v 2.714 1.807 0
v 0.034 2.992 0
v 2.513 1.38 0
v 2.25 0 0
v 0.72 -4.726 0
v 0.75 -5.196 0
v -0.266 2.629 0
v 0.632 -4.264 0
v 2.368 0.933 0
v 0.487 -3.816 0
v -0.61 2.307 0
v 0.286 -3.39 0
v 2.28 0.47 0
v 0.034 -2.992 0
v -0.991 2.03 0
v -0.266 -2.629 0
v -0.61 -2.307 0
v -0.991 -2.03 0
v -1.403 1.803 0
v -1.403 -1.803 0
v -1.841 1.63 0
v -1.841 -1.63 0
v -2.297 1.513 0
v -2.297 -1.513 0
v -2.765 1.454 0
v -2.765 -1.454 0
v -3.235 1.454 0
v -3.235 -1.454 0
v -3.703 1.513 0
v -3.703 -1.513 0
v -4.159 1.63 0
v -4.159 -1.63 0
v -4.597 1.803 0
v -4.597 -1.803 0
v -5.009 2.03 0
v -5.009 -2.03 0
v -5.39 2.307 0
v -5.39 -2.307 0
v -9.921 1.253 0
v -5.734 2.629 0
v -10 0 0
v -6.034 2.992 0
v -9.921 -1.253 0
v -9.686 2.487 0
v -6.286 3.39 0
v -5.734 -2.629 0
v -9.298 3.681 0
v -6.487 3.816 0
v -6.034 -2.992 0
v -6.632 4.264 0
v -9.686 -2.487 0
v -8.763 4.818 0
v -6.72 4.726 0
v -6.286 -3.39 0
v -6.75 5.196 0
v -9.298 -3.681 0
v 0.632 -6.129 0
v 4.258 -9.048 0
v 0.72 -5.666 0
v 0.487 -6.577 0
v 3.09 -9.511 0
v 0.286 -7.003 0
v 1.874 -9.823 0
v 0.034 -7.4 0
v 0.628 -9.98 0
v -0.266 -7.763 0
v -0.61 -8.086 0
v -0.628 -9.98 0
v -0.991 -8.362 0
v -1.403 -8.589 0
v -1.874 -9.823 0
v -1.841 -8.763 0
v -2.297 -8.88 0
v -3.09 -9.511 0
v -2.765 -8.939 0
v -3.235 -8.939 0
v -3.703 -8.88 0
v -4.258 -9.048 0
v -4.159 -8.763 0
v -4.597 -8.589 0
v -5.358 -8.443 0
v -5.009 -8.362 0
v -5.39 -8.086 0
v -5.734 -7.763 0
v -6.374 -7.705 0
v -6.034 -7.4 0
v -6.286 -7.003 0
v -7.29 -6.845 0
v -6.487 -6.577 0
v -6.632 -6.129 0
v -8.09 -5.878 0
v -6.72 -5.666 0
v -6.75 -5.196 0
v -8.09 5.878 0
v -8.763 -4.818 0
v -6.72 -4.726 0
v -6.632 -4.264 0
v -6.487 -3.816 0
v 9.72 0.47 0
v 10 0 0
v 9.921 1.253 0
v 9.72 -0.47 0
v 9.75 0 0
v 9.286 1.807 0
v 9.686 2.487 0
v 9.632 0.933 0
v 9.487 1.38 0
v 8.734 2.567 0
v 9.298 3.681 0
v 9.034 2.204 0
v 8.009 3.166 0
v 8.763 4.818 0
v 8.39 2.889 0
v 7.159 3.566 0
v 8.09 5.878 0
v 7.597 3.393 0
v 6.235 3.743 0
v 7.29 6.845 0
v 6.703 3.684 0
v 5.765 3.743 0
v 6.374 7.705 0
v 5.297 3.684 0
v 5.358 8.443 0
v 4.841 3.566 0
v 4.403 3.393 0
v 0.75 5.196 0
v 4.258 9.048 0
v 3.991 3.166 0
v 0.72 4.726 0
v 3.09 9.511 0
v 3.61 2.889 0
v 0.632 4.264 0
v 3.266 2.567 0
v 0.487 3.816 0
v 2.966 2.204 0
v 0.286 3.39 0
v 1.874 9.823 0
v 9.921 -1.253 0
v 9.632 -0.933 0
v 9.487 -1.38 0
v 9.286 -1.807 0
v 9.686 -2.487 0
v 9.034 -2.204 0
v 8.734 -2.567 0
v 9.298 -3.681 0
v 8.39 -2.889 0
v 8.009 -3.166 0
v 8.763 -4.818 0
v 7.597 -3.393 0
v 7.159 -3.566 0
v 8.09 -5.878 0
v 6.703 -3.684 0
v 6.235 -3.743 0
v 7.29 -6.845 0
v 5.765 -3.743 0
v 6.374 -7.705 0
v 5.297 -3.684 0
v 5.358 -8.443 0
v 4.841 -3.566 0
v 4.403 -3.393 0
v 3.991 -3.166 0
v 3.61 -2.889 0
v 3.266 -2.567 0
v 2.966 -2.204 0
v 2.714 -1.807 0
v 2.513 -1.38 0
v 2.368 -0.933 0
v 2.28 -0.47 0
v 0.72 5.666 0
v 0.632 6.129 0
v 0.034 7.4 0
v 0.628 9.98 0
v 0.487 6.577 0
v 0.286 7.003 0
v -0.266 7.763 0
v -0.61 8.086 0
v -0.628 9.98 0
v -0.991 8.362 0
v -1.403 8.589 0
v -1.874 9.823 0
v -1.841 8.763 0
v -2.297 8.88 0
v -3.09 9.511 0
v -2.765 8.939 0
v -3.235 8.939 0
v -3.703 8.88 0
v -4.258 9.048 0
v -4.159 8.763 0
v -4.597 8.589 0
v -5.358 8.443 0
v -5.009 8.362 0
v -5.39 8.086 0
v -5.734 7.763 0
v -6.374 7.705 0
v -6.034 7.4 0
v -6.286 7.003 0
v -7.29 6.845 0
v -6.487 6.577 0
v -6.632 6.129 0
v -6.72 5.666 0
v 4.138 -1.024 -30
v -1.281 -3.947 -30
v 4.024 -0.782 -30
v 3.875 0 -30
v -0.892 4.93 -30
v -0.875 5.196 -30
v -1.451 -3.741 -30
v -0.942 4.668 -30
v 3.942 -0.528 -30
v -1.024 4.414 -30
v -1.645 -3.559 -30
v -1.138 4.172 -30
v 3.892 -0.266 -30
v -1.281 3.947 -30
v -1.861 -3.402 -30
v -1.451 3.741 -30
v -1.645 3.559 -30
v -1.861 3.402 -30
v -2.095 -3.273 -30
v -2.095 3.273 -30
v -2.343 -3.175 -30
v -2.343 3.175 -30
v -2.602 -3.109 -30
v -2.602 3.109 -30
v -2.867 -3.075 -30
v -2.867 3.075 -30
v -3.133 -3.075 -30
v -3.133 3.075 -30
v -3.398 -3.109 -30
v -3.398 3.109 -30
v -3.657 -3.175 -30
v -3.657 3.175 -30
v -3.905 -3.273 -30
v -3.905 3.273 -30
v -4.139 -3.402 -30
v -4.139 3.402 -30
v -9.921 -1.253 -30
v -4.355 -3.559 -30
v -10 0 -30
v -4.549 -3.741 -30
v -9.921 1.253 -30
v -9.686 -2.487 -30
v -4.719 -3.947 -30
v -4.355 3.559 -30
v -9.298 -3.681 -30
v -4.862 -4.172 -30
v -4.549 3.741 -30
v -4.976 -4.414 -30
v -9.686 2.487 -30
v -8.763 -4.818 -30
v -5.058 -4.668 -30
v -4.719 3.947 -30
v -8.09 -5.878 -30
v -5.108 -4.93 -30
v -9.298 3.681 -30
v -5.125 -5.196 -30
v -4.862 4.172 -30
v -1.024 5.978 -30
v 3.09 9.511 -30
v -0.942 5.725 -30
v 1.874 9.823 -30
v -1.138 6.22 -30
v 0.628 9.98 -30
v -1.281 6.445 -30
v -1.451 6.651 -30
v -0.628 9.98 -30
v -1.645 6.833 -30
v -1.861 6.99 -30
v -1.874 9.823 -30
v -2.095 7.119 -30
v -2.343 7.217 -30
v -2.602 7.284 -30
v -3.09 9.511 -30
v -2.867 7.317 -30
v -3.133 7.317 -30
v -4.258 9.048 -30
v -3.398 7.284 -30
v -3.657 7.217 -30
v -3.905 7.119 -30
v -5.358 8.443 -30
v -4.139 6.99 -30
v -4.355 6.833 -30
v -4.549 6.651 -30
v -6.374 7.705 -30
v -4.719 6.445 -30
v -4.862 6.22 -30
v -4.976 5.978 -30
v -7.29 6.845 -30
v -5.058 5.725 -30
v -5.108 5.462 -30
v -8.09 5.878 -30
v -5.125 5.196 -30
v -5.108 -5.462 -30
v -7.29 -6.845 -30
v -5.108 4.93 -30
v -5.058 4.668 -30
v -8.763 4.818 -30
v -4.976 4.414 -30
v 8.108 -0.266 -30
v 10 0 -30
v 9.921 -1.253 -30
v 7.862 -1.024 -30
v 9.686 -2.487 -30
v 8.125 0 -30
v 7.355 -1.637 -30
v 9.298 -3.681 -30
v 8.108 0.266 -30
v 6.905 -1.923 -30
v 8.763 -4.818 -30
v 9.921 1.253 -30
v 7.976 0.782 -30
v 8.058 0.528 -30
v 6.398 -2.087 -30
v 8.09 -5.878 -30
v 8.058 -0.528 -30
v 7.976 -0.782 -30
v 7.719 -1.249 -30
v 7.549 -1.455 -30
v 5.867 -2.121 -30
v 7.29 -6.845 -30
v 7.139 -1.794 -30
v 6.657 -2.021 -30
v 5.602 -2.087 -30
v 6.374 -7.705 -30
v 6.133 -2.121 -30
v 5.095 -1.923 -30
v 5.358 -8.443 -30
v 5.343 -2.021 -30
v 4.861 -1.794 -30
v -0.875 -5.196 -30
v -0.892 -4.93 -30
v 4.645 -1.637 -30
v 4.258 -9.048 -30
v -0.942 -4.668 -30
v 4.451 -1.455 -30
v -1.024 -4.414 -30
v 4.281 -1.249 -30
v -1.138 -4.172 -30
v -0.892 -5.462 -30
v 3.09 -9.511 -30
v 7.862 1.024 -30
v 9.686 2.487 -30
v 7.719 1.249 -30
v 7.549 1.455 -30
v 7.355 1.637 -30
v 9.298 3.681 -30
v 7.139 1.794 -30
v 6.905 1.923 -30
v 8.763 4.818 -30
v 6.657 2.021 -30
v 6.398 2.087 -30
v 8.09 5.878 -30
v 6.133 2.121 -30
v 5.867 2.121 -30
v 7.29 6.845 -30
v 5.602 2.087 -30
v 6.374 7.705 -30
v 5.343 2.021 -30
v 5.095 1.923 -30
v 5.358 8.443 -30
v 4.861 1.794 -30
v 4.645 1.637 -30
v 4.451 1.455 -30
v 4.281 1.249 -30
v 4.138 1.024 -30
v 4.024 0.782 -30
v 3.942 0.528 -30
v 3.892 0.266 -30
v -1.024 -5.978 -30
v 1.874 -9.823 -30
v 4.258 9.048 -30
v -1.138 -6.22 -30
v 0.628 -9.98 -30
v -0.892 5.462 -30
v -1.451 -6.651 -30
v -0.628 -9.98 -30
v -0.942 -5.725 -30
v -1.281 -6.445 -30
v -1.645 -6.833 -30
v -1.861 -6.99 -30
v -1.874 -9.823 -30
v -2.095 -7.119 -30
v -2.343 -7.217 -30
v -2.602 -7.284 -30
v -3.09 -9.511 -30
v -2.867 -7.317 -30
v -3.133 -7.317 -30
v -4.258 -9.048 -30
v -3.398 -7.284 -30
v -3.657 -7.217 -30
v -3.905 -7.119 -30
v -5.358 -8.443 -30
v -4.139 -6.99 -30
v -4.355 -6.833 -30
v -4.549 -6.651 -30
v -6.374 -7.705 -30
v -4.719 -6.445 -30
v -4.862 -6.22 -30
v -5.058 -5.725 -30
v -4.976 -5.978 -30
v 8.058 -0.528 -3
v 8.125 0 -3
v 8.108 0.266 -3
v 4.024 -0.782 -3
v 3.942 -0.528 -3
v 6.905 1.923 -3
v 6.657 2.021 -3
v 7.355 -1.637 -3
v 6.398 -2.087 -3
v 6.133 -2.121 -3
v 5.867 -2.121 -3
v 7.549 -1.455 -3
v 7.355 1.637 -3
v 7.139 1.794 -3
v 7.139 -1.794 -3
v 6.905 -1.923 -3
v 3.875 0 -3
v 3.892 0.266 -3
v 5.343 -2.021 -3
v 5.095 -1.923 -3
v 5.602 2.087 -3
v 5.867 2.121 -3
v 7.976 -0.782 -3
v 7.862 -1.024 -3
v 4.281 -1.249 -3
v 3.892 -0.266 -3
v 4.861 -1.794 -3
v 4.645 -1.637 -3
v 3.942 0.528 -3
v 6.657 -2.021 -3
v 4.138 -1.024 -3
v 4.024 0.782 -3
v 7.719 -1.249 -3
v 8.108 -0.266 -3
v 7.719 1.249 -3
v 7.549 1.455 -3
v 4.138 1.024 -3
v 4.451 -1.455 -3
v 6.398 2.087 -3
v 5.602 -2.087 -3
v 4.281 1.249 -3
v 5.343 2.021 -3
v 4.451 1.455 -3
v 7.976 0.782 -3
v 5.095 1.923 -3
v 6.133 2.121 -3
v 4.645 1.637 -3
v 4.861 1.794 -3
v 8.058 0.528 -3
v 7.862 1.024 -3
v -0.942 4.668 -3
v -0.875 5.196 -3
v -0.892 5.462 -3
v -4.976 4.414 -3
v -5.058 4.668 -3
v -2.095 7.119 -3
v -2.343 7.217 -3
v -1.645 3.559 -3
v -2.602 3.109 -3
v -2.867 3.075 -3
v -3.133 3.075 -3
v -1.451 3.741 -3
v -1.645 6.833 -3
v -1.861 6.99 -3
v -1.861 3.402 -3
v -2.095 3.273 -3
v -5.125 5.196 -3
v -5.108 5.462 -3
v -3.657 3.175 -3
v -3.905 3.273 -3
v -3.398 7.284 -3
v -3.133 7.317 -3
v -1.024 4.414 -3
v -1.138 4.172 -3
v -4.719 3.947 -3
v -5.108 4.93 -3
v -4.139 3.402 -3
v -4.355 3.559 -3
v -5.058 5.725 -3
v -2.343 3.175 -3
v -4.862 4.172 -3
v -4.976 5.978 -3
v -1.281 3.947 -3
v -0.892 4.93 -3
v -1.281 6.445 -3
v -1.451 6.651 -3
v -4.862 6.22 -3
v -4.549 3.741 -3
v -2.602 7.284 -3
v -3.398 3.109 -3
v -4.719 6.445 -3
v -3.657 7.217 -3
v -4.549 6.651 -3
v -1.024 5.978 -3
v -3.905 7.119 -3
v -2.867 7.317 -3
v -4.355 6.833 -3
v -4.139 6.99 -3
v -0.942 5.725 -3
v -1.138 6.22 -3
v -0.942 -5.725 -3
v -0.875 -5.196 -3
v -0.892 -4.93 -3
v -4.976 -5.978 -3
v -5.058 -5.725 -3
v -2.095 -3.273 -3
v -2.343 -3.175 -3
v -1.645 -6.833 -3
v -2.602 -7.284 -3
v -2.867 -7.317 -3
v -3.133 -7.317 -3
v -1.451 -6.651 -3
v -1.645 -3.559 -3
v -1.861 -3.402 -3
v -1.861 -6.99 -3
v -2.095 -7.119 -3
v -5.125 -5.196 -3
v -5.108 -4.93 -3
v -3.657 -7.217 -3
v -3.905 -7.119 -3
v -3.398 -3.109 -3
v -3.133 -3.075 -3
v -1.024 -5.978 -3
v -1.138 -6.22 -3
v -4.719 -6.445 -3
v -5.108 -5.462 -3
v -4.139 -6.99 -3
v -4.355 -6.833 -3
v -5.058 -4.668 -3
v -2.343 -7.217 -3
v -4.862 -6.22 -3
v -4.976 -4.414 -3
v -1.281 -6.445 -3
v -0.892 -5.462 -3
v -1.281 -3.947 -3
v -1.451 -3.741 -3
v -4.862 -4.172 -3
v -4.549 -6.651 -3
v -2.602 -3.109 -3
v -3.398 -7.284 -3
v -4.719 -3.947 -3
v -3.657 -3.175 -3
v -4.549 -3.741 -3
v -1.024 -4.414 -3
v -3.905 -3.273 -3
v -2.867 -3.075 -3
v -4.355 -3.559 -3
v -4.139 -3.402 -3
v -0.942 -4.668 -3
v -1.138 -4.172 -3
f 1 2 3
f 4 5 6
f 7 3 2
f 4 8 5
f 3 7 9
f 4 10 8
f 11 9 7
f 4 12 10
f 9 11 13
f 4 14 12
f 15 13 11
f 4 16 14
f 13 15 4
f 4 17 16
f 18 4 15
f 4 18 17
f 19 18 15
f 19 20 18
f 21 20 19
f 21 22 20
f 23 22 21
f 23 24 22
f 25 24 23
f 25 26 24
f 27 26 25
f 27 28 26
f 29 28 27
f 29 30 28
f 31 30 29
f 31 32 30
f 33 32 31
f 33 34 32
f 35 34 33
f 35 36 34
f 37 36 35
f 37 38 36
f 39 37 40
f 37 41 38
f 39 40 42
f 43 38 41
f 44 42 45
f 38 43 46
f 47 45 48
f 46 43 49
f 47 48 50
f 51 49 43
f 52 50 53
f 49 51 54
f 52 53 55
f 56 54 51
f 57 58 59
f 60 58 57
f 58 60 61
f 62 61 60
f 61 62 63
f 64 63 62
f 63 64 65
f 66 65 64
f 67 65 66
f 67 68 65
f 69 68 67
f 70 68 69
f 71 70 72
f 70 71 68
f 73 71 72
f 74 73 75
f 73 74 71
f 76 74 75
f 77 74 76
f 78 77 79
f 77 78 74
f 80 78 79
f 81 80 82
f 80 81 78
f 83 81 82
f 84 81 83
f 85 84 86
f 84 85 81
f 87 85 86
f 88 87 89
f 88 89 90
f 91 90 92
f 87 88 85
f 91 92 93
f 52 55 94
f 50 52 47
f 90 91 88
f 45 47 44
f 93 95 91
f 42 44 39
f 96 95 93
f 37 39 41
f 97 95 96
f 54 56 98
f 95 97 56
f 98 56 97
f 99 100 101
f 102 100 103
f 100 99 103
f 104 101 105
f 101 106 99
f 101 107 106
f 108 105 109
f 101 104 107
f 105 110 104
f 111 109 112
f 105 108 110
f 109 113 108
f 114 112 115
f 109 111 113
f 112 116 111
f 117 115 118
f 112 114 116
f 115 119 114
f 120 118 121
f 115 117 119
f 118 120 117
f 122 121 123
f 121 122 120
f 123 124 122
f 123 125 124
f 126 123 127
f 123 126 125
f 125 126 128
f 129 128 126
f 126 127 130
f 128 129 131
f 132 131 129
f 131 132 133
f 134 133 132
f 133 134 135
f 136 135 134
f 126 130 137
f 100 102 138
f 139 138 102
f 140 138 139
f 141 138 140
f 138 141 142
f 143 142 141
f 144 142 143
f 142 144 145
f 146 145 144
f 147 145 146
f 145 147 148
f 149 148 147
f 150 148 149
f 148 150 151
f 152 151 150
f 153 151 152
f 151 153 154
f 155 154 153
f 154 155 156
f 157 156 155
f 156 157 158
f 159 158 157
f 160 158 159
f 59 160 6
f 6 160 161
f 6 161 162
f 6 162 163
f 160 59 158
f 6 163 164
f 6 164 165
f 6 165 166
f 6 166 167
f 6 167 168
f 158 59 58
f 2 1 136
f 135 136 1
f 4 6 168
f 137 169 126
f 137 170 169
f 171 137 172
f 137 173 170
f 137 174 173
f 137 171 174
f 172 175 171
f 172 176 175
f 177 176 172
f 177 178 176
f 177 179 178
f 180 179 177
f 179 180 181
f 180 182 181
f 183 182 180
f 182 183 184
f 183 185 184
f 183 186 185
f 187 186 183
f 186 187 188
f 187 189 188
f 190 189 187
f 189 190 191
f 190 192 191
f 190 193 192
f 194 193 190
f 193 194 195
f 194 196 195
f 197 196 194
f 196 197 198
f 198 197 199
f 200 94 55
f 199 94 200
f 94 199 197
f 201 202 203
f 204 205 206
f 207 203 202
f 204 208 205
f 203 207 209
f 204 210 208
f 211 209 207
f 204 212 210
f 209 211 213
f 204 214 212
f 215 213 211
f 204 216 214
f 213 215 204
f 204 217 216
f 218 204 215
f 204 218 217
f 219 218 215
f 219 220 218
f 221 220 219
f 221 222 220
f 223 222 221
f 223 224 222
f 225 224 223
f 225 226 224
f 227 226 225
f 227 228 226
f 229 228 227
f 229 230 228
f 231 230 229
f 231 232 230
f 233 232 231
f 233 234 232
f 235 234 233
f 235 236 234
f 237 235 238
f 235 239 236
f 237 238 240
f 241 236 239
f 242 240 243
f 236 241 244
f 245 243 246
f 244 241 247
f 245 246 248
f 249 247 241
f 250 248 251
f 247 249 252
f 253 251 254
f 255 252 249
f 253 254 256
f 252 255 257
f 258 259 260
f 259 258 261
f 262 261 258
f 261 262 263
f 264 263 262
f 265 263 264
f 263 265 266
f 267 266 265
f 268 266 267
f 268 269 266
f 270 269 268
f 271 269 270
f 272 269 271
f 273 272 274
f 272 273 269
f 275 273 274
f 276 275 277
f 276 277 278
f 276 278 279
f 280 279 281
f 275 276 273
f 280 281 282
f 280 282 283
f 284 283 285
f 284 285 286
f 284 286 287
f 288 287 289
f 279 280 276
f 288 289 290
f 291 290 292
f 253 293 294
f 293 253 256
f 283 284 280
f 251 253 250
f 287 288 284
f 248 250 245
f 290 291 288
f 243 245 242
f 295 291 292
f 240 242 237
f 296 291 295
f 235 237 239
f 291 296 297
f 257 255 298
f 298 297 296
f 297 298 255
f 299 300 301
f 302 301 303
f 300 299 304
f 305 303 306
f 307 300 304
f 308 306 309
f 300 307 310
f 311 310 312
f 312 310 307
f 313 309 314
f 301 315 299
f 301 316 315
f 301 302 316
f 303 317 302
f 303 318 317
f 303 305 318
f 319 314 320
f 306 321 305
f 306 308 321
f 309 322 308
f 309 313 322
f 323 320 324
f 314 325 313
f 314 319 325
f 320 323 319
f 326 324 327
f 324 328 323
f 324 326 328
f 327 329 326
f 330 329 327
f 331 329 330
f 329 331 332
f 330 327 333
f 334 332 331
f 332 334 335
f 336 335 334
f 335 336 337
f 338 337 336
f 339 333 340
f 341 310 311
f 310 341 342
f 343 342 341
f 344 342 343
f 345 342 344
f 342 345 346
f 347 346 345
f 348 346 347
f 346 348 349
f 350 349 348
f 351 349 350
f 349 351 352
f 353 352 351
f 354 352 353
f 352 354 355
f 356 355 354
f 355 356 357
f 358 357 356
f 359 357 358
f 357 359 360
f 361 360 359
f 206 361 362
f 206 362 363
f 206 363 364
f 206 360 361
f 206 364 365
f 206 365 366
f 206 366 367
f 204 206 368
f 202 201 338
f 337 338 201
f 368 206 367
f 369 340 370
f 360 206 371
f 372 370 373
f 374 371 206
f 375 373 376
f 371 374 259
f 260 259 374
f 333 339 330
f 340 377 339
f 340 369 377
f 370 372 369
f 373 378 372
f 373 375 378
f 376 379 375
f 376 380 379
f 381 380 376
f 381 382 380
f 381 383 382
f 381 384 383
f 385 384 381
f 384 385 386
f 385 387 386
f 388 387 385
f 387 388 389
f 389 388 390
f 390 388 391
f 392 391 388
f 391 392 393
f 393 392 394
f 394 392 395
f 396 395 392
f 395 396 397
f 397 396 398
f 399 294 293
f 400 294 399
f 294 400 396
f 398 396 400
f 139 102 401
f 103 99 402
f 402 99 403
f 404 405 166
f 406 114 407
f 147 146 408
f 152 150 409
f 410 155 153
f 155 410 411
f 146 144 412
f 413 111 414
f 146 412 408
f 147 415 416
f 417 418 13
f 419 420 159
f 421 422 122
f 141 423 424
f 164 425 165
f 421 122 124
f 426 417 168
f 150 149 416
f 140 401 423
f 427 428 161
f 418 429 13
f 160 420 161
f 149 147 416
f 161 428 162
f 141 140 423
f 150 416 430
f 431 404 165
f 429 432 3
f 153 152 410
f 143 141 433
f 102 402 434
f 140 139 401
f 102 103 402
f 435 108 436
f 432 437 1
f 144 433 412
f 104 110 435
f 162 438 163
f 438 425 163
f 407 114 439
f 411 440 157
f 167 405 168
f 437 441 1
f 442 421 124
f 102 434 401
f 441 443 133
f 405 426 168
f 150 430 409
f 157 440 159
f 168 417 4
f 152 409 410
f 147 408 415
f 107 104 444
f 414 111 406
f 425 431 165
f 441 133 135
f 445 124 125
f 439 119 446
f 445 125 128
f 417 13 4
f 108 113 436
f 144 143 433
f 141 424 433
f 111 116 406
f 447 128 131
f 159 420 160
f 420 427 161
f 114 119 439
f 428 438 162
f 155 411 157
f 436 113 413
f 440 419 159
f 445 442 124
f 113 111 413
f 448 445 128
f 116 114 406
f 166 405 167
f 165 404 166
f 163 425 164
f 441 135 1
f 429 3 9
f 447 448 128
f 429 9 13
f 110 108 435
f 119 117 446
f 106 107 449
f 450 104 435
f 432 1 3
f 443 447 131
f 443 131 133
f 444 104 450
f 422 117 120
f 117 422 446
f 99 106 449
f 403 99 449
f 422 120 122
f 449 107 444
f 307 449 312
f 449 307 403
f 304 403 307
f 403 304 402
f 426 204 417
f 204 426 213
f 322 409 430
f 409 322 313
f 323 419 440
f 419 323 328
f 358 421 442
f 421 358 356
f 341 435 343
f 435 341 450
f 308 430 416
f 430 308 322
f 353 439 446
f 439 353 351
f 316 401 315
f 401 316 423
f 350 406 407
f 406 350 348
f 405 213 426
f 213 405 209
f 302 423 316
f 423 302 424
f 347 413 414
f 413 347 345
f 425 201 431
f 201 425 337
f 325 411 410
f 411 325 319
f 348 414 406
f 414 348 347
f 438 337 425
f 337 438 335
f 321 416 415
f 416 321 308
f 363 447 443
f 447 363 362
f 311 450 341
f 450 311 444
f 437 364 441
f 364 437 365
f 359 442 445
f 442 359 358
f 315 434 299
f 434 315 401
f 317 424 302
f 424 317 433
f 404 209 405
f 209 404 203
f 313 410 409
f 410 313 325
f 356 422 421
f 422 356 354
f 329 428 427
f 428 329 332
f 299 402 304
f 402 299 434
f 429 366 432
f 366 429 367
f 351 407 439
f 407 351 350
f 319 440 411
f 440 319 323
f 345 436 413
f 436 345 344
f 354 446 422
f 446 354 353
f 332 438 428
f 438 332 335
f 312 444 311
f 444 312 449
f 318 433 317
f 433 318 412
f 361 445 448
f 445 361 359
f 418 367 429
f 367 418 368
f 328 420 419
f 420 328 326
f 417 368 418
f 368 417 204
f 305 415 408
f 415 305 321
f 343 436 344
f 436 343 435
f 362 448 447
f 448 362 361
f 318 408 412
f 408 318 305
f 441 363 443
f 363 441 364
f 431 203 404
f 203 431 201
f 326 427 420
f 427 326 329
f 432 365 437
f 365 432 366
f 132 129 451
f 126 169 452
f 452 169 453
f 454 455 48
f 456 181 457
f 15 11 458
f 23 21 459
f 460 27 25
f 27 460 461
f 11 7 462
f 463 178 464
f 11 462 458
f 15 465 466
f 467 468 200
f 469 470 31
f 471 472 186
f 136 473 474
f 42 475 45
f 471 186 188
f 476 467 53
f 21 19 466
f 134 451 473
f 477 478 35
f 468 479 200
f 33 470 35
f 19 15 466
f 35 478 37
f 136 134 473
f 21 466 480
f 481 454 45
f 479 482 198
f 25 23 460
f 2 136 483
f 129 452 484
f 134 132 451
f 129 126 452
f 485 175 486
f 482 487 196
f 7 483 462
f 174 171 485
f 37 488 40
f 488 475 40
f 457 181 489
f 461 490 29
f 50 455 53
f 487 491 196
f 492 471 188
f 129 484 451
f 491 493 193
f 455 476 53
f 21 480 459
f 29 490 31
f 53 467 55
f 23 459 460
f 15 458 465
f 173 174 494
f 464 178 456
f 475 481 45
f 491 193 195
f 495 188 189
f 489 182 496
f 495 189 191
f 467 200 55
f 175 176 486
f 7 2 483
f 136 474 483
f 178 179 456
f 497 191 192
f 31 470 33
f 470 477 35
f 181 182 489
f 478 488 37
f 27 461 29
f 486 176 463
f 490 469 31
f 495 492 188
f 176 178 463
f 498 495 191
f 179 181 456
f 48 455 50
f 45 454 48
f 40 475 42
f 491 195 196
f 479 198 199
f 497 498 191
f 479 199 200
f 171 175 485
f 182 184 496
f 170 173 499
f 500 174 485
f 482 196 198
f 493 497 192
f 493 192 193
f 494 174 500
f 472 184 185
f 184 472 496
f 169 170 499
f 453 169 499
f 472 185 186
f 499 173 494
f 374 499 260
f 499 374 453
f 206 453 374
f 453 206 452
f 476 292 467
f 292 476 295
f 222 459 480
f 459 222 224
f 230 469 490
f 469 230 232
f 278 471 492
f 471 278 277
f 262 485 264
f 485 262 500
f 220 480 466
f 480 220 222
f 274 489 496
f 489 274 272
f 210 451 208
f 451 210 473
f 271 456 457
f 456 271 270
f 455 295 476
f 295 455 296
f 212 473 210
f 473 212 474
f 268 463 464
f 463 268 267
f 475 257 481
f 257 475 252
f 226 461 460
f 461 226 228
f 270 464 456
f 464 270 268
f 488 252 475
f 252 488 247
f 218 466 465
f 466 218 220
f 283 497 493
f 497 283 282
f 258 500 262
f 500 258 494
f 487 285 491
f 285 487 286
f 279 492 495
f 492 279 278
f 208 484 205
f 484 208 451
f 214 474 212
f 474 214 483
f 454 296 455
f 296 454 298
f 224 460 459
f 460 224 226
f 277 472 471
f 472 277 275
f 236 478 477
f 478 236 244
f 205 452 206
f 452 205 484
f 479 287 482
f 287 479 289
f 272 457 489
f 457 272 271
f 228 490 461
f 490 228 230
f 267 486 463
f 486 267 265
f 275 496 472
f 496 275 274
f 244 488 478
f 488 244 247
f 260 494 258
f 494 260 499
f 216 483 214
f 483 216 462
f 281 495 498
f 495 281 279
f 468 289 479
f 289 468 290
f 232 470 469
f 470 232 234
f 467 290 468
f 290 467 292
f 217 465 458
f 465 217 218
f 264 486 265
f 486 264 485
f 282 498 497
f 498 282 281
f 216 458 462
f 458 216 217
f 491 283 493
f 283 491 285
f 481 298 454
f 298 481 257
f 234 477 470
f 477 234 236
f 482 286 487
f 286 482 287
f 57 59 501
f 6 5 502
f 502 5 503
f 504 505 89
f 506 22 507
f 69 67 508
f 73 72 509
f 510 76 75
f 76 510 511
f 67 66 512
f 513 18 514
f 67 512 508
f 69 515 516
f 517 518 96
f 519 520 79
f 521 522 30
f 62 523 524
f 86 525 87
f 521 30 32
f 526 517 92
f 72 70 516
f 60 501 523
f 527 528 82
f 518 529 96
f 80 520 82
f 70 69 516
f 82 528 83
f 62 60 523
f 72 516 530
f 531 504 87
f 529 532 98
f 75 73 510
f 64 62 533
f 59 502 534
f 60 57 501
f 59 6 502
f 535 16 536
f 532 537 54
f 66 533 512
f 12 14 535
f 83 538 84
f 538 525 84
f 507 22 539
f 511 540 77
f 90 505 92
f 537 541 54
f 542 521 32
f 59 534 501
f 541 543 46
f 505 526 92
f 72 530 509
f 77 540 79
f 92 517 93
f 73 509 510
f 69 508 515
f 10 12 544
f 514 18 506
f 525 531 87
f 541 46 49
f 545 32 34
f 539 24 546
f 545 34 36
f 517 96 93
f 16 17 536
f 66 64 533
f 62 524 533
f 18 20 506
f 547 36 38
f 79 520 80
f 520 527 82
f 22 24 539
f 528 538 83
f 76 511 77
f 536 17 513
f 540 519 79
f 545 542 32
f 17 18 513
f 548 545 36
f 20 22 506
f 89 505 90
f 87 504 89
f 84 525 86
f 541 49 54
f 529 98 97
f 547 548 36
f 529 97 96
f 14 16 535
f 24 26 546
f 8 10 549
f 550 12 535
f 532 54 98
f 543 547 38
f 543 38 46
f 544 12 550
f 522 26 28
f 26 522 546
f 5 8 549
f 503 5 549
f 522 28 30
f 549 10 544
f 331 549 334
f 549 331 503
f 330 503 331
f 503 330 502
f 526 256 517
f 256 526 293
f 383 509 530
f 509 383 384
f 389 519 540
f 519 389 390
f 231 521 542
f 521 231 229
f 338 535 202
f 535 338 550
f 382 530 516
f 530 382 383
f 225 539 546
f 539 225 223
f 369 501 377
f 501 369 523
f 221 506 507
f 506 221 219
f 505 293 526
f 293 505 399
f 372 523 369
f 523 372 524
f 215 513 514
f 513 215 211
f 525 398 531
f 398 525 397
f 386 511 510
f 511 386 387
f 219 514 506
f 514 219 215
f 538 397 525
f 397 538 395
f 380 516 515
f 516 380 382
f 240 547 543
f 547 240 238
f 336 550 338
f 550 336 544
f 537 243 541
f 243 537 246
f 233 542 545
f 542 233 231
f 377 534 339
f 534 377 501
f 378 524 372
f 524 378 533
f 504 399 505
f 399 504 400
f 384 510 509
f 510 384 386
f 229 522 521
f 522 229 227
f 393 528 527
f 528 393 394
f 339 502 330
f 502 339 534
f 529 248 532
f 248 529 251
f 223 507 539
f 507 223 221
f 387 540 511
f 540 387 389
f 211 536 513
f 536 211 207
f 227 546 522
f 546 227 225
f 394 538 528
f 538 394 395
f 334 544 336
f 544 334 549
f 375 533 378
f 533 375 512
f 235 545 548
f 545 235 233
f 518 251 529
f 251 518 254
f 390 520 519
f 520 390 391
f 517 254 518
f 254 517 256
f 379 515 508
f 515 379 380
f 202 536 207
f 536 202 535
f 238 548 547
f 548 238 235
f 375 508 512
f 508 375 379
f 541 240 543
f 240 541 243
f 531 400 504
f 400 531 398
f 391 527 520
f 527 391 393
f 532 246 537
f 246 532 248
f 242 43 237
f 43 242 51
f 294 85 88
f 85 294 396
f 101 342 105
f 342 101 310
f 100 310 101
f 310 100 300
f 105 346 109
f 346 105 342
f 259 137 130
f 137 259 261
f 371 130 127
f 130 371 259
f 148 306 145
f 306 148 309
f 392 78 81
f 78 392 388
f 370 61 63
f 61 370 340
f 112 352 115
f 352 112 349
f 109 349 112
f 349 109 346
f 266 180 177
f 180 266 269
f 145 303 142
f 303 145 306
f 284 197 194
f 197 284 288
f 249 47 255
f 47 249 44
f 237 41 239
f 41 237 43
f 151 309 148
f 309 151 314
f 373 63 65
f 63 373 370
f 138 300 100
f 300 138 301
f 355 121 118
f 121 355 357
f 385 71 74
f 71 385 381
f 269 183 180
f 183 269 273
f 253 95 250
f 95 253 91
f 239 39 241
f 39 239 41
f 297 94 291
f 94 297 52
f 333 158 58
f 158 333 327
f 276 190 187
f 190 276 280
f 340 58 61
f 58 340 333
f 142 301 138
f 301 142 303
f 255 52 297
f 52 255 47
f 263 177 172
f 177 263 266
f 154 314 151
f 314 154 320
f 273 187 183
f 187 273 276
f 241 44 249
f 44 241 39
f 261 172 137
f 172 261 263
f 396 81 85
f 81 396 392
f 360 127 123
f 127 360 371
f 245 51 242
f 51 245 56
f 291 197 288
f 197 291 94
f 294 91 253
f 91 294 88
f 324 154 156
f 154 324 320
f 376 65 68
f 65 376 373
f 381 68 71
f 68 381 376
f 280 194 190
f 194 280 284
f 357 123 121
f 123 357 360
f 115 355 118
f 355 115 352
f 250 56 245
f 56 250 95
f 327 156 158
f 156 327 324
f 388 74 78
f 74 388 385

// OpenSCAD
$fn = 50;


difference() {
	union() {
		translate(v = [0, 0, -30.0000000000]) {
			cylinder(h = 30, r = 10.0000000000);
		}
	}
	union() {
		translate(v = [6.0000000000, 0.0000000000, 0]) {
			rotate(a = [0, 0, 0]) {
				difference() {
					union() {
						#translate(v = [0, 0, -30.0000000000]) {
							cylinder(h = 30, r = 2.0000000000);
						}
						#translate(v = [0, 0, -3]) {
							cylinder(h = 3, r = 10.0000000000, r1 = 2.1250000000, r2 = 3.7500000000);
						}
						#translate(v = [0, 0, -30.0000000000]) {
							cylinder(h = 30, r = 2.1250000000);
						}
						#translate(v = [0, 0, -30.0000000000]) {
							cylinder(h = 30, r = 2.0000000000);
						}
					}
					union();
				}
			}
		}
		translate(v = [-3.0000000000, 5.1961524227, 0]) {
			rotate(a = [0, 0, 0]) {
				difference() {
					union() {
						#translate(v = [0, 0, -30.0000000000]) {
							cylinder(h = 30, r = 2.0000000000);
						}
						#translate(v = [0, 0, -3]) {
							cylinder(h = 3, r = 10.0000000000, r1 = 2.1250000000, r2 = 3.7500000000);
						}
						#translate(v = [0, 0, -30.0000000000]) {
							cylinder(h = 30, r = 2.1250000000);
						}
						#translate(v = [0, 0, -30.0000000000]) {
							cylinder(h = 30, r = 2.0000000000);
						}
					}
					union();
				}
			}
		}
		translate(v = [-3.0000000000, -5.1961524227, 0]) {
			rotate(a = [0, 0, 0]) {
				difference() {
					union() {
						#translate(v = [0, 0, -30.0000000000]) {
							cylinder(h = 30, r = 2.0000000000);
						}
						#translate(v = [0, 0, -3]) {
							cylinder(h = 3, r = 10.0000000000, r1 = 2.1250000000, r2 = 3.7500000000);
						}
						#translate(v = [0, 0, -30.0000000000]) {
							cylinder(h = 30, r = 2.1250000000);
						}
						#translate(v = [0, 0, -30.0000000000]) {
							cylinder(h = 30, r = 2.0000000000);
						}
					}
					union();
				}
			}
		}
	}
}
